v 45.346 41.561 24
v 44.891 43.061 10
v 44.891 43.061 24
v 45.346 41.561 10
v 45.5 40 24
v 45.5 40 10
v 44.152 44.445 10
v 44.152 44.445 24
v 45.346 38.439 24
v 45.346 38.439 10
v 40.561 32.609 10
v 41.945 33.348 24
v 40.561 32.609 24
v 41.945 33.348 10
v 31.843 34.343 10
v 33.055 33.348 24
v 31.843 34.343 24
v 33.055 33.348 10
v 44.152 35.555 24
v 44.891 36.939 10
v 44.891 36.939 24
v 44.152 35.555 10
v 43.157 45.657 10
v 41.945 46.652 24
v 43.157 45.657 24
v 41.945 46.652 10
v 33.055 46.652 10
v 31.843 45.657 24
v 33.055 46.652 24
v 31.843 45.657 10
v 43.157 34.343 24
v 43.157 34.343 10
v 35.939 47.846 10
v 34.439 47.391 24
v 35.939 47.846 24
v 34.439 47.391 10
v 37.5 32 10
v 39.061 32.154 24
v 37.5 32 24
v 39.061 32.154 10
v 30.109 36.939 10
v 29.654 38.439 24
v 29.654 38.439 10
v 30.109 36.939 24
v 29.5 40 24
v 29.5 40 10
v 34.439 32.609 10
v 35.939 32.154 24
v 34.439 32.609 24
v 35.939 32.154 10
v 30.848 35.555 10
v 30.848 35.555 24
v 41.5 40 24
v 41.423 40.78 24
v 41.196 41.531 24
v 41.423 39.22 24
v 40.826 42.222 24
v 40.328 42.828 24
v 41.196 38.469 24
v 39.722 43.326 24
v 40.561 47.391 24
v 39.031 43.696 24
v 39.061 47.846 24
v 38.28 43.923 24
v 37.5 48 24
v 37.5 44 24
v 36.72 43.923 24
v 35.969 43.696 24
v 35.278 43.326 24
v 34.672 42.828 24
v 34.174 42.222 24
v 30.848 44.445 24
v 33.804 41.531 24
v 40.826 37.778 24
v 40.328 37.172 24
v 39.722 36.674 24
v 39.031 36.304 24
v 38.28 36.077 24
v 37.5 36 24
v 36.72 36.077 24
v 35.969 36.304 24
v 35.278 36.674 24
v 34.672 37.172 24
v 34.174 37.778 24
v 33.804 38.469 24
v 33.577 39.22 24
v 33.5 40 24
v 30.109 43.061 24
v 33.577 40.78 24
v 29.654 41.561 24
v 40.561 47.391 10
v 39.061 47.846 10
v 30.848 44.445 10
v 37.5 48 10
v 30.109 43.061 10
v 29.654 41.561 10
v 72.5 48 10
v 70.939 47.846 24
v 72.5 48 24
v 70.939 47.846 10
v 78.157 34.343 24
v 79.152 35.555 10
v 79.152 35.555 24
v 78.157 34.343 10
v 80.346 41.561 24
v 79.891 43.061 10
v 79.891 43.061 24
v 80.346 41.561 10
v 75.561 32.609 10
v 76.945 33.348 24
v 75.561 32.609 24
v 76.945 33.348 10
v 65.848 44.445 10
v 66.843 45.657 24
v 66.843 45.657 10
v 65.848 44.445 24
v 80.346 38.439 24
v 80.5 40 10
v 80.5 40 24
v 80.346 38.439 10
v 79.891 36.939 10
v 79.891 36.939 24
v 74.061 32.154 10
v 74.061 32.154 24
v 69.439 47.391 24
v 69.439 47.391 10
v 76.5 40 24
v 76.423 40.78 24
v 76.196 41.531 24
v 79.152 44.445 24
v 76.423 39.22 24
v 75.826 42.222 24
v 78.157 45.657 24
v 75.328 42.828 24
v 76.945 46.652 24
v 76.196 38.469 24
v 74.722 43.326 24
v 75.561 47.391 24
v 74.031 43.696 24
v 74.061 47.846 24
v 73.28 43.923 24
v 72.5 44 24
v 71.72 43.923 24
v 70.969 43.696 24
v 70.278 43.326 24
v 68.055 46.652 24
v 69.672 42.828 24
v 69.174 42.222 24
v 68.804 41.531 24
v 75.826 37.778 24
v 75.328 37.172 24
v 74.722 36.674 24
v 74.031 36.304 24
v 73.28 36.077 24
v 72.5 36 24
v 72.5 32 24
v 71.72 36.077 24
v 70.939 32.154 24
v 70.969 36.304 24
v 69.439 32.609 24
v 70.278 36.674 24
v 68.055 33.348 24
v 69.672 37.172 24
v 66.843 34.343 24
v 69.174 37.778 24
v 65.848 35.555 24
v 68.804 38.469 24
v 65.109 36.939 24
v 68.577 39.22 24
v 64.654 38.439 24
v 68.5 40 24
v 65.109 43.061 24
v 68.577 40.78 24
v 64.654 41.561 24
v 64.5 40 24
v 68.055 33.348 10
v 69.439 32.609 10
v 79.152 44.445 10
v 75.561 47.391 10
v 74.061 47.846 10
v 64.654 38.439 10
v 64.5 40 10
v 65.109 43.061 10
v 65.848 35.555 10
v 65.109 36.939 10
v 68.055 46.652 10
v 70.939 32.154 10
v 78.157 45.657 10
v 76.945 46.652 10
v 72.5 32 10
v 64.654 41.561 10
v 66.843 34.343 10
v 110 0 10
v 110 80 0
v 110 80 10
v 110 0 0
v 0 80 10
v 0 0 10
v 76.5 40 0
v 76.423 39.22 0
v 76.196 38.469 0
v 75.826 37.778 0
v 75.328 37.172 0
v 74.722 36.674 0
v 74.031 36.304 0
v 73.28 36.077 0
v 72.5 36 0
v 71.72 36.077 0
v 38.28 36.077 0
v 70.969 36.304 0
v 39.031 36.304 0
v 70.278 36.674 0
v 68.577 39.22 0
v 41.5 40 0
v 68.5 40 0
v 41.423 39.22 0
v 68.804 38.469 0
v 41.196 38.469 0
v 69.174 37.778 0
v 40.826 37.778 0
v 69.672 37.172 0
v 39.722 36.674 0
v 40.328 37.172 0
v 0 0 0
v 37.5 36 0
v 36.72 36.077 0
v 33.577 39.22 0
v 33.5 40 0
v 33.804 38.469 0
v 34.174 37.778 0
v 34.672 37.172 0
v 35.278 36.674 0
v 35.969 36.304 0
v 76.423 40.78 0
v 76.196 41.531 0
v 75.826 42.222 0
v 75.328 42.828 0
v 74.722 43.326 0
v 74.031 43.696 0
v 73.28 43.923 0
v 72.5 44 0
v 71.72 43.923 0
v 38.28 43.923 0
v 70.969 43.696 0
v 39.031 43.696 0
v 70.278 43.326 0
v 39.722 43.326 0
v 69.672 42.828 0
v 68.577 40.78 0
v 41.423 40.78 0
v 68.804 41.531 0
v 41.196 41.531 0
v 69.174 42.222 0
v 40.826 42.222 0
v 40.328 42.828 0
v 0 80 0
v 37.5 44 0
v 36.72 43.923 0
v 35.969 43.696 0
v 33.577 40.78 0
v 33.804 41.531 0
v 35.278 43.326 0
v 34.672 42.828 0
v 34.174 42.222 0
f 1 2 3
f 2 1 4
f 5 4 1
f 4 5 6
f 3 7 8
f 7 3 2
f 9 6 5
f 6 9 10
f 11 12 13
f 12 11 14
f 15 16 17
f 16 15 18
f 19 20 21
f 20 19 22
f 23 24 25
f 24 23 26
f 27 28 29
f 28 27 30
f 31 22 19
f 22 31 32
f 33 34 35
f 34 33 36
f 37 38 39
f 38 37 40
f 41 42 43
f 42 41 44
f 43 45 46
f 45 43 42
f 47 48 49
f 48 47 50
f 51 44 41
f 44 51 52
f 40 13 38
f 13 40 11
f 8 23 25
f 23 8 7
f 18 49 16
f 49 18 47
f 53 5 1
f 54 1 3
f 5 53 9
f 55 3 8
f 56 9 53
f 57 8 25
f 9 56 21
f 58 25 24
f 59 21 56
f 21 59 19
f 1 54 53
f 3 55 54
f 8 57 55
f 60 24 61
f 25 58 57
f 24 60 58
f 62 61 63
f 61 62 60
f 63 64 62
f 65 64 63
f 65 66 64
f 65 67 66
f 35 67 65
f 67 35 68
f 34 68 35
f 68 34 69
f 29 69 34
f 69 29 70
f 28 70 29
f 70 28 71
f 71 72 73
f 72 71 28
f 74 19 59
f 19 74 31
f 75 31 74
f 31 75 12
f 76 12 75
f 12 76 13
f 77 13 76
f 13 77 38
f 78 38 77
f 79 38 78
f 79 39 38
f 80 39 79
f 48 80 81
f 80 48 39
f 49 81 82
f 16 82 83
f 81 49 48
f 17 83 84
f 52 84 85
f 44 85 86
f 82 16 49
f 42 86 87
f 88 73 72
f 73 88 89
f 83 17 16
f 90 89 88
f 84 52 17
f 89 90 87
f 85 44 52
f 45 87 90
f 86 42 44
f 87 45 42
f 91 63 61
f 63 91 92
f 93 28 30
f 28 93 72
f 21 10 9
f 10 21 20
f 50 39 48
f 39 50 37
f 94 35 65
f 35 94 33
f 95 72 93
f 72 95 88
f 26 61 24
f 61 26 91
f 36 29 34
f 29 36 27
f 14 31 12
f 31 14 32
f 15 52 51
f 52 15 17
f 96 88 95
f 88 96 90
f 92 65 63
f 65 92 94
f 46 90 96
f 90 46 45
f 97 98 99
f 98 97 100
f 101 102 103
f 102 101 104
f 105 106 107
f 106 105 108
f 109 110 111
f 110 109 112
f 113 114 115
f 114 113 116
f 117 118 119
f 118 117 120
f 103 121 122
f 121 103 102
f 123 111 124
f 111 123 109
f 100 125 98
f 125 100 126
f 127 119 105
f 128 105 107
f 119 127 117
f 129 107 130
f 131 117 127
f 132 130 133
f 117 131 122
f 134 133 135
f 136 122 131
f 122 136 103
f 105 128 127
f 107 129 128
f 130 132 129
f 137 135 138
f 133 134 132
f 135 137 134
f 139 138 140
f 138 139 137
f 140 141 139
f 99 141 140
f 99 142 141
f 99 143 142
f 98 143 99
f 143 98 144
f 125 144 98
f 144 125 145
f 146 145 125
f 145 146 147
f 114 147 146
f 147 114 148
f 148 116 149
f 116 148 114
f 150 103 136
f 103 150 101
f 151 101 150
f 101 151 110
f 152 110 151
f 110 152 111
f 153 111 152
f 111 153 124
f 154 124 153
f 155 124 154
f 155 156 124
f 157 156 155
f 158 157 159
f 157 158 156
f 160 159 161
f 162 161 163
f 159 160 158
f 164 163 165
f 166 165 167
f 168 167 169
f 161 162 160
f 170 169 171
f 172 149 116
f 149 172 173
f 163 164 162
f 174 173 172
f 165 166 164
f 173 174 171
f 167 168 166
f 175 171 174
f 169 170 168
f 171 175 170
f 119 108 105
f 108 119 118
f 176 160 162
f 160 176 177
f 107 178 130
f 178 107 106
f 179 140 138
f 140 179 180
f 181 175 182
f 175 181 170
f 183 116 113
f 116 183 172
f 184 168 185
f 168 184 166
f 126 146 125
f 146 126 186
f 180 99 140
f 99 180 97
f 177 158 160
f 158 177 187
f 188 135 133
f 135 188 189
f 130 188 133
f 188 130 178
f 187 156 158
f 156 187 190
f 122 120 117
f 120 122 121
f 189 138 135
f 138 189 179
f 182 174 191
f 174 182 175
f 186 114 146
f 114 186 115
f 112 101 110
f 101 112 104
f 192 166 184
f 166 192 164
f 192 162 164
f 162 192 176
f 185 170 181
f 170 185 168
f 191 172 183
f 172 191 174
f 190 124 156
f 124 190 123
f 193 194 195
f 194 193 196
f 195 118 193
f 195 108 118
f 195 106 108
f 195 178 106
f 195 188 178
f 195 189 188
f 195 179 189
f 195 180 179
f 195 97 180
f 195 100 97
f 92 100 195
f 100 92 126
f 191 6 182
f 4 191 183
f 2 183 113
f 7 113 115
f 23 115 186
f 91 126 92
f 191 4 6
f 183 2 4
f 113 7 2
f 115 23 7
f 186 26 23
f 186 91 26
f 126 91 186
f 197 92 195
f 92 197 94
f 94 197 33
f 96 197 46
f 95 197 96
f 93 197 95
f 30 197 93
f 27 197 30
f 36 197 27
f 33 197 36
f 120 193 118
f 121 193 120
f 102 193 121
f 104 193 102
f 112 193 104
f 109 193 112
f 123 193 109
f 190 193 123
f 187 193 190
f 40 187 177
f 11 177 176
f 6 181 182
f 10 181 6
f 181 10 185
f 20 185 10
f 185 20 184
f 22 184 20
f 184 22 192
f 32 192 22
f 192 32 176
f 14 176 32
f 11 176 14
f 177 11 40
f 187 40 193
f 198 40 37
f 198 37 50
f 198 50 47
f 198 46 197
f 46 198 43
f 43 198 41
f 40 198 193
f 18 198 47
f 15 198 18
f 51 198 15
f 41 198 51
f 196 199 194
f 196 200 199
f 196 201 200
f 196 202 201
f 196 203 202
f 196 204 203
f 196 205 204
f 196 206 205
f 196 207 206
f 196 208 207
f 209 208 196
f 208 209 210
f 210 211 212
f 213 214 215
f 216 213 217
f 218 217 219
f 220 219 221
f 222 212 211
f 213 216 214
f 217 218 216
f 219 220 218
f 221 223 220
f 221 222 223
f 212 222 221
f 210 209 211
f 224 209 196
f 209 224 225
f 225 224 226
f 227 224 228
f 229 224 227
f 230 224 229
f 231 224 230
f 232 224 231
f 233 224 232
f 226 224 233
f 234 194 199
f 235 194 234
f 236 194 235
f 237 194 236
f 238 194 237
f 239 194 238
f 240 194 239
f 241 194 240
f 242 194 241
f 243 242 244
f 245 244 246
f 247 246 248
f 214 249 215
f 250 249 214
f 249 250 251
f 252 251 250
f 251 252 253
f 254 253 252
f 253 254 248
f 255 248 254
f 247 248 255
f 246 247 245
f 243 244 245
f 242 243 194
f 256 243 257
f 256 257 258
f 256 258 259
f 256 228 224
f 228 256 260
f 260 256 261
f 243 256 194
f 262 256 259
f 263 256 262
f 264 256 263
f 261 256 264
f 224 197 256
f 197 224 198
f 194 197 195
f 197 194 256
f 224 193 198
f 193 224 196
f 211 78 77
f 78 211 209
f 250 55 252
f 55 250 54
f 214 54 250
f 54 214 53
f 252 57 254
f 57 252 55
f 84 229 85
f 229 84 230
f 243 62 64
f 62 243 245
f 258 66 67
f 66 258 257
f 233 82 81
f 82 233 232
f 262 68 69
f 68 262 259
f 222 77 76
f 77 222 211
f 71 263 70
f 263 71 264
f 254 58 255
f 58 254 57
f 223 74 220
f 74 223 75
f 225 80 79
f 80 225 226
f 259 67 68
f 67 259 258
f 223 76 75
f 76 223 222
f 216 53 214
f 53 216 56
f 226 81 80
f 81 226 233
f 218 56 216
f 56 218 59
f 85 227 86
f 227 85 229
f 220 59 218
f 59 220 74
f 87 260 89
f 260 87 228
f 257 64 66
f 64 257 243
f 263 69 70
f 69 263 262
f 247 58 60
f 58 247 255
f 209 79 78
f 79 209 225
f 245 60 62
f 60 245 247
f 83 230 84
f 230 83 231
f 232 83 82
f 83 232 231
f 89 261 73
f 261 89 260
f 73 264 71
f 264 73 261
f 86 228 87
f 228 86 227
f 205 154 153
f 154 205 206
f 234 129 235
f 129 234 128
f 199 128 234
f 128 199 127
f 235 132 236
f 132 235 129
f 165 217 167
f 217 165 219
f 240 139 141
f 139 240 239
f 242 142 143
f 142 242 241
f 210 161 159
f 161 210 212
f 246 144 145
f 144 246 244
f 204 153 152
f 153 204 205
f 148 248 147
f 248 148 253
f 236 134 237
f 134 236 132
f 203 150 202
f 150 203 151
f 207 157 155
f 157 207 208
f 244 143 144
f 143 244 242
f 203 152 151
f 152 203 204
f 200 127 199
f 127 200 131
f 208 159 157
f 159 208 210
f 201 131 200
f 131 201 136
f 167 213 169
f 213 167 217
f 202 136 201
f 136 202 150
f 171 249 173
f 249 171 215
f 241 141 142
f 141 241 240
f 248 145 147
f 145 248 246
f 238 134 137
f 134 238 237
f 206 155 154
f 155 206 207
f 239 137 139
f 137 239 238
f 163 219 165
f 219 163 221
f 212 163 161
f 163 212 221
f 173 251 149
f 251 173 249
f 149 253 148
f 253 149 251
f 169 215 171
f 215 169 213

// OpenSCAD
$fn = 32;

// ----------------------------------------------------------------------
// Drill jig: two_boss jig
// ----------------------------------------------------------------------

// --- parameters (mm) ---
plate_l = 110;            // plate length, X
plate_w = 80;             // plate width, Y
plate_t = 10;             // plate thickness
boss_d = 16;              // guide boss diameter
boss_h = 15;              // boss height above the plate
guide_d = 8;              // guide hole diameter
boss_pitch = 35;          // boss pitch

n_boss = 2;  // guide bosses
boss_x0 = (plate_l - (n_boss - 1) * boss_pitch) / 2;  // first boss X
boss_top = plate_t - 1 + boss_h;  // boss crown height
total_h = boss_top;  // overall height

difference() {
  union() {
  cube([plate_l, plate_w, plate_t]);
  for (i = [0 : n_boss - 1])
    translate([boss_x0 + i * boss_pitch, plate_w / 2, plate_t - 1])
      cylinder(h = boss_h, d = boss_d);
  }
  for (i = [0 : n_boss - 1])
    translate([boss_x0 + i * boss_pitch, plate_w / 2, -1])
      cylinder(h = plate_t + boss_h, d = guide_d);
}
